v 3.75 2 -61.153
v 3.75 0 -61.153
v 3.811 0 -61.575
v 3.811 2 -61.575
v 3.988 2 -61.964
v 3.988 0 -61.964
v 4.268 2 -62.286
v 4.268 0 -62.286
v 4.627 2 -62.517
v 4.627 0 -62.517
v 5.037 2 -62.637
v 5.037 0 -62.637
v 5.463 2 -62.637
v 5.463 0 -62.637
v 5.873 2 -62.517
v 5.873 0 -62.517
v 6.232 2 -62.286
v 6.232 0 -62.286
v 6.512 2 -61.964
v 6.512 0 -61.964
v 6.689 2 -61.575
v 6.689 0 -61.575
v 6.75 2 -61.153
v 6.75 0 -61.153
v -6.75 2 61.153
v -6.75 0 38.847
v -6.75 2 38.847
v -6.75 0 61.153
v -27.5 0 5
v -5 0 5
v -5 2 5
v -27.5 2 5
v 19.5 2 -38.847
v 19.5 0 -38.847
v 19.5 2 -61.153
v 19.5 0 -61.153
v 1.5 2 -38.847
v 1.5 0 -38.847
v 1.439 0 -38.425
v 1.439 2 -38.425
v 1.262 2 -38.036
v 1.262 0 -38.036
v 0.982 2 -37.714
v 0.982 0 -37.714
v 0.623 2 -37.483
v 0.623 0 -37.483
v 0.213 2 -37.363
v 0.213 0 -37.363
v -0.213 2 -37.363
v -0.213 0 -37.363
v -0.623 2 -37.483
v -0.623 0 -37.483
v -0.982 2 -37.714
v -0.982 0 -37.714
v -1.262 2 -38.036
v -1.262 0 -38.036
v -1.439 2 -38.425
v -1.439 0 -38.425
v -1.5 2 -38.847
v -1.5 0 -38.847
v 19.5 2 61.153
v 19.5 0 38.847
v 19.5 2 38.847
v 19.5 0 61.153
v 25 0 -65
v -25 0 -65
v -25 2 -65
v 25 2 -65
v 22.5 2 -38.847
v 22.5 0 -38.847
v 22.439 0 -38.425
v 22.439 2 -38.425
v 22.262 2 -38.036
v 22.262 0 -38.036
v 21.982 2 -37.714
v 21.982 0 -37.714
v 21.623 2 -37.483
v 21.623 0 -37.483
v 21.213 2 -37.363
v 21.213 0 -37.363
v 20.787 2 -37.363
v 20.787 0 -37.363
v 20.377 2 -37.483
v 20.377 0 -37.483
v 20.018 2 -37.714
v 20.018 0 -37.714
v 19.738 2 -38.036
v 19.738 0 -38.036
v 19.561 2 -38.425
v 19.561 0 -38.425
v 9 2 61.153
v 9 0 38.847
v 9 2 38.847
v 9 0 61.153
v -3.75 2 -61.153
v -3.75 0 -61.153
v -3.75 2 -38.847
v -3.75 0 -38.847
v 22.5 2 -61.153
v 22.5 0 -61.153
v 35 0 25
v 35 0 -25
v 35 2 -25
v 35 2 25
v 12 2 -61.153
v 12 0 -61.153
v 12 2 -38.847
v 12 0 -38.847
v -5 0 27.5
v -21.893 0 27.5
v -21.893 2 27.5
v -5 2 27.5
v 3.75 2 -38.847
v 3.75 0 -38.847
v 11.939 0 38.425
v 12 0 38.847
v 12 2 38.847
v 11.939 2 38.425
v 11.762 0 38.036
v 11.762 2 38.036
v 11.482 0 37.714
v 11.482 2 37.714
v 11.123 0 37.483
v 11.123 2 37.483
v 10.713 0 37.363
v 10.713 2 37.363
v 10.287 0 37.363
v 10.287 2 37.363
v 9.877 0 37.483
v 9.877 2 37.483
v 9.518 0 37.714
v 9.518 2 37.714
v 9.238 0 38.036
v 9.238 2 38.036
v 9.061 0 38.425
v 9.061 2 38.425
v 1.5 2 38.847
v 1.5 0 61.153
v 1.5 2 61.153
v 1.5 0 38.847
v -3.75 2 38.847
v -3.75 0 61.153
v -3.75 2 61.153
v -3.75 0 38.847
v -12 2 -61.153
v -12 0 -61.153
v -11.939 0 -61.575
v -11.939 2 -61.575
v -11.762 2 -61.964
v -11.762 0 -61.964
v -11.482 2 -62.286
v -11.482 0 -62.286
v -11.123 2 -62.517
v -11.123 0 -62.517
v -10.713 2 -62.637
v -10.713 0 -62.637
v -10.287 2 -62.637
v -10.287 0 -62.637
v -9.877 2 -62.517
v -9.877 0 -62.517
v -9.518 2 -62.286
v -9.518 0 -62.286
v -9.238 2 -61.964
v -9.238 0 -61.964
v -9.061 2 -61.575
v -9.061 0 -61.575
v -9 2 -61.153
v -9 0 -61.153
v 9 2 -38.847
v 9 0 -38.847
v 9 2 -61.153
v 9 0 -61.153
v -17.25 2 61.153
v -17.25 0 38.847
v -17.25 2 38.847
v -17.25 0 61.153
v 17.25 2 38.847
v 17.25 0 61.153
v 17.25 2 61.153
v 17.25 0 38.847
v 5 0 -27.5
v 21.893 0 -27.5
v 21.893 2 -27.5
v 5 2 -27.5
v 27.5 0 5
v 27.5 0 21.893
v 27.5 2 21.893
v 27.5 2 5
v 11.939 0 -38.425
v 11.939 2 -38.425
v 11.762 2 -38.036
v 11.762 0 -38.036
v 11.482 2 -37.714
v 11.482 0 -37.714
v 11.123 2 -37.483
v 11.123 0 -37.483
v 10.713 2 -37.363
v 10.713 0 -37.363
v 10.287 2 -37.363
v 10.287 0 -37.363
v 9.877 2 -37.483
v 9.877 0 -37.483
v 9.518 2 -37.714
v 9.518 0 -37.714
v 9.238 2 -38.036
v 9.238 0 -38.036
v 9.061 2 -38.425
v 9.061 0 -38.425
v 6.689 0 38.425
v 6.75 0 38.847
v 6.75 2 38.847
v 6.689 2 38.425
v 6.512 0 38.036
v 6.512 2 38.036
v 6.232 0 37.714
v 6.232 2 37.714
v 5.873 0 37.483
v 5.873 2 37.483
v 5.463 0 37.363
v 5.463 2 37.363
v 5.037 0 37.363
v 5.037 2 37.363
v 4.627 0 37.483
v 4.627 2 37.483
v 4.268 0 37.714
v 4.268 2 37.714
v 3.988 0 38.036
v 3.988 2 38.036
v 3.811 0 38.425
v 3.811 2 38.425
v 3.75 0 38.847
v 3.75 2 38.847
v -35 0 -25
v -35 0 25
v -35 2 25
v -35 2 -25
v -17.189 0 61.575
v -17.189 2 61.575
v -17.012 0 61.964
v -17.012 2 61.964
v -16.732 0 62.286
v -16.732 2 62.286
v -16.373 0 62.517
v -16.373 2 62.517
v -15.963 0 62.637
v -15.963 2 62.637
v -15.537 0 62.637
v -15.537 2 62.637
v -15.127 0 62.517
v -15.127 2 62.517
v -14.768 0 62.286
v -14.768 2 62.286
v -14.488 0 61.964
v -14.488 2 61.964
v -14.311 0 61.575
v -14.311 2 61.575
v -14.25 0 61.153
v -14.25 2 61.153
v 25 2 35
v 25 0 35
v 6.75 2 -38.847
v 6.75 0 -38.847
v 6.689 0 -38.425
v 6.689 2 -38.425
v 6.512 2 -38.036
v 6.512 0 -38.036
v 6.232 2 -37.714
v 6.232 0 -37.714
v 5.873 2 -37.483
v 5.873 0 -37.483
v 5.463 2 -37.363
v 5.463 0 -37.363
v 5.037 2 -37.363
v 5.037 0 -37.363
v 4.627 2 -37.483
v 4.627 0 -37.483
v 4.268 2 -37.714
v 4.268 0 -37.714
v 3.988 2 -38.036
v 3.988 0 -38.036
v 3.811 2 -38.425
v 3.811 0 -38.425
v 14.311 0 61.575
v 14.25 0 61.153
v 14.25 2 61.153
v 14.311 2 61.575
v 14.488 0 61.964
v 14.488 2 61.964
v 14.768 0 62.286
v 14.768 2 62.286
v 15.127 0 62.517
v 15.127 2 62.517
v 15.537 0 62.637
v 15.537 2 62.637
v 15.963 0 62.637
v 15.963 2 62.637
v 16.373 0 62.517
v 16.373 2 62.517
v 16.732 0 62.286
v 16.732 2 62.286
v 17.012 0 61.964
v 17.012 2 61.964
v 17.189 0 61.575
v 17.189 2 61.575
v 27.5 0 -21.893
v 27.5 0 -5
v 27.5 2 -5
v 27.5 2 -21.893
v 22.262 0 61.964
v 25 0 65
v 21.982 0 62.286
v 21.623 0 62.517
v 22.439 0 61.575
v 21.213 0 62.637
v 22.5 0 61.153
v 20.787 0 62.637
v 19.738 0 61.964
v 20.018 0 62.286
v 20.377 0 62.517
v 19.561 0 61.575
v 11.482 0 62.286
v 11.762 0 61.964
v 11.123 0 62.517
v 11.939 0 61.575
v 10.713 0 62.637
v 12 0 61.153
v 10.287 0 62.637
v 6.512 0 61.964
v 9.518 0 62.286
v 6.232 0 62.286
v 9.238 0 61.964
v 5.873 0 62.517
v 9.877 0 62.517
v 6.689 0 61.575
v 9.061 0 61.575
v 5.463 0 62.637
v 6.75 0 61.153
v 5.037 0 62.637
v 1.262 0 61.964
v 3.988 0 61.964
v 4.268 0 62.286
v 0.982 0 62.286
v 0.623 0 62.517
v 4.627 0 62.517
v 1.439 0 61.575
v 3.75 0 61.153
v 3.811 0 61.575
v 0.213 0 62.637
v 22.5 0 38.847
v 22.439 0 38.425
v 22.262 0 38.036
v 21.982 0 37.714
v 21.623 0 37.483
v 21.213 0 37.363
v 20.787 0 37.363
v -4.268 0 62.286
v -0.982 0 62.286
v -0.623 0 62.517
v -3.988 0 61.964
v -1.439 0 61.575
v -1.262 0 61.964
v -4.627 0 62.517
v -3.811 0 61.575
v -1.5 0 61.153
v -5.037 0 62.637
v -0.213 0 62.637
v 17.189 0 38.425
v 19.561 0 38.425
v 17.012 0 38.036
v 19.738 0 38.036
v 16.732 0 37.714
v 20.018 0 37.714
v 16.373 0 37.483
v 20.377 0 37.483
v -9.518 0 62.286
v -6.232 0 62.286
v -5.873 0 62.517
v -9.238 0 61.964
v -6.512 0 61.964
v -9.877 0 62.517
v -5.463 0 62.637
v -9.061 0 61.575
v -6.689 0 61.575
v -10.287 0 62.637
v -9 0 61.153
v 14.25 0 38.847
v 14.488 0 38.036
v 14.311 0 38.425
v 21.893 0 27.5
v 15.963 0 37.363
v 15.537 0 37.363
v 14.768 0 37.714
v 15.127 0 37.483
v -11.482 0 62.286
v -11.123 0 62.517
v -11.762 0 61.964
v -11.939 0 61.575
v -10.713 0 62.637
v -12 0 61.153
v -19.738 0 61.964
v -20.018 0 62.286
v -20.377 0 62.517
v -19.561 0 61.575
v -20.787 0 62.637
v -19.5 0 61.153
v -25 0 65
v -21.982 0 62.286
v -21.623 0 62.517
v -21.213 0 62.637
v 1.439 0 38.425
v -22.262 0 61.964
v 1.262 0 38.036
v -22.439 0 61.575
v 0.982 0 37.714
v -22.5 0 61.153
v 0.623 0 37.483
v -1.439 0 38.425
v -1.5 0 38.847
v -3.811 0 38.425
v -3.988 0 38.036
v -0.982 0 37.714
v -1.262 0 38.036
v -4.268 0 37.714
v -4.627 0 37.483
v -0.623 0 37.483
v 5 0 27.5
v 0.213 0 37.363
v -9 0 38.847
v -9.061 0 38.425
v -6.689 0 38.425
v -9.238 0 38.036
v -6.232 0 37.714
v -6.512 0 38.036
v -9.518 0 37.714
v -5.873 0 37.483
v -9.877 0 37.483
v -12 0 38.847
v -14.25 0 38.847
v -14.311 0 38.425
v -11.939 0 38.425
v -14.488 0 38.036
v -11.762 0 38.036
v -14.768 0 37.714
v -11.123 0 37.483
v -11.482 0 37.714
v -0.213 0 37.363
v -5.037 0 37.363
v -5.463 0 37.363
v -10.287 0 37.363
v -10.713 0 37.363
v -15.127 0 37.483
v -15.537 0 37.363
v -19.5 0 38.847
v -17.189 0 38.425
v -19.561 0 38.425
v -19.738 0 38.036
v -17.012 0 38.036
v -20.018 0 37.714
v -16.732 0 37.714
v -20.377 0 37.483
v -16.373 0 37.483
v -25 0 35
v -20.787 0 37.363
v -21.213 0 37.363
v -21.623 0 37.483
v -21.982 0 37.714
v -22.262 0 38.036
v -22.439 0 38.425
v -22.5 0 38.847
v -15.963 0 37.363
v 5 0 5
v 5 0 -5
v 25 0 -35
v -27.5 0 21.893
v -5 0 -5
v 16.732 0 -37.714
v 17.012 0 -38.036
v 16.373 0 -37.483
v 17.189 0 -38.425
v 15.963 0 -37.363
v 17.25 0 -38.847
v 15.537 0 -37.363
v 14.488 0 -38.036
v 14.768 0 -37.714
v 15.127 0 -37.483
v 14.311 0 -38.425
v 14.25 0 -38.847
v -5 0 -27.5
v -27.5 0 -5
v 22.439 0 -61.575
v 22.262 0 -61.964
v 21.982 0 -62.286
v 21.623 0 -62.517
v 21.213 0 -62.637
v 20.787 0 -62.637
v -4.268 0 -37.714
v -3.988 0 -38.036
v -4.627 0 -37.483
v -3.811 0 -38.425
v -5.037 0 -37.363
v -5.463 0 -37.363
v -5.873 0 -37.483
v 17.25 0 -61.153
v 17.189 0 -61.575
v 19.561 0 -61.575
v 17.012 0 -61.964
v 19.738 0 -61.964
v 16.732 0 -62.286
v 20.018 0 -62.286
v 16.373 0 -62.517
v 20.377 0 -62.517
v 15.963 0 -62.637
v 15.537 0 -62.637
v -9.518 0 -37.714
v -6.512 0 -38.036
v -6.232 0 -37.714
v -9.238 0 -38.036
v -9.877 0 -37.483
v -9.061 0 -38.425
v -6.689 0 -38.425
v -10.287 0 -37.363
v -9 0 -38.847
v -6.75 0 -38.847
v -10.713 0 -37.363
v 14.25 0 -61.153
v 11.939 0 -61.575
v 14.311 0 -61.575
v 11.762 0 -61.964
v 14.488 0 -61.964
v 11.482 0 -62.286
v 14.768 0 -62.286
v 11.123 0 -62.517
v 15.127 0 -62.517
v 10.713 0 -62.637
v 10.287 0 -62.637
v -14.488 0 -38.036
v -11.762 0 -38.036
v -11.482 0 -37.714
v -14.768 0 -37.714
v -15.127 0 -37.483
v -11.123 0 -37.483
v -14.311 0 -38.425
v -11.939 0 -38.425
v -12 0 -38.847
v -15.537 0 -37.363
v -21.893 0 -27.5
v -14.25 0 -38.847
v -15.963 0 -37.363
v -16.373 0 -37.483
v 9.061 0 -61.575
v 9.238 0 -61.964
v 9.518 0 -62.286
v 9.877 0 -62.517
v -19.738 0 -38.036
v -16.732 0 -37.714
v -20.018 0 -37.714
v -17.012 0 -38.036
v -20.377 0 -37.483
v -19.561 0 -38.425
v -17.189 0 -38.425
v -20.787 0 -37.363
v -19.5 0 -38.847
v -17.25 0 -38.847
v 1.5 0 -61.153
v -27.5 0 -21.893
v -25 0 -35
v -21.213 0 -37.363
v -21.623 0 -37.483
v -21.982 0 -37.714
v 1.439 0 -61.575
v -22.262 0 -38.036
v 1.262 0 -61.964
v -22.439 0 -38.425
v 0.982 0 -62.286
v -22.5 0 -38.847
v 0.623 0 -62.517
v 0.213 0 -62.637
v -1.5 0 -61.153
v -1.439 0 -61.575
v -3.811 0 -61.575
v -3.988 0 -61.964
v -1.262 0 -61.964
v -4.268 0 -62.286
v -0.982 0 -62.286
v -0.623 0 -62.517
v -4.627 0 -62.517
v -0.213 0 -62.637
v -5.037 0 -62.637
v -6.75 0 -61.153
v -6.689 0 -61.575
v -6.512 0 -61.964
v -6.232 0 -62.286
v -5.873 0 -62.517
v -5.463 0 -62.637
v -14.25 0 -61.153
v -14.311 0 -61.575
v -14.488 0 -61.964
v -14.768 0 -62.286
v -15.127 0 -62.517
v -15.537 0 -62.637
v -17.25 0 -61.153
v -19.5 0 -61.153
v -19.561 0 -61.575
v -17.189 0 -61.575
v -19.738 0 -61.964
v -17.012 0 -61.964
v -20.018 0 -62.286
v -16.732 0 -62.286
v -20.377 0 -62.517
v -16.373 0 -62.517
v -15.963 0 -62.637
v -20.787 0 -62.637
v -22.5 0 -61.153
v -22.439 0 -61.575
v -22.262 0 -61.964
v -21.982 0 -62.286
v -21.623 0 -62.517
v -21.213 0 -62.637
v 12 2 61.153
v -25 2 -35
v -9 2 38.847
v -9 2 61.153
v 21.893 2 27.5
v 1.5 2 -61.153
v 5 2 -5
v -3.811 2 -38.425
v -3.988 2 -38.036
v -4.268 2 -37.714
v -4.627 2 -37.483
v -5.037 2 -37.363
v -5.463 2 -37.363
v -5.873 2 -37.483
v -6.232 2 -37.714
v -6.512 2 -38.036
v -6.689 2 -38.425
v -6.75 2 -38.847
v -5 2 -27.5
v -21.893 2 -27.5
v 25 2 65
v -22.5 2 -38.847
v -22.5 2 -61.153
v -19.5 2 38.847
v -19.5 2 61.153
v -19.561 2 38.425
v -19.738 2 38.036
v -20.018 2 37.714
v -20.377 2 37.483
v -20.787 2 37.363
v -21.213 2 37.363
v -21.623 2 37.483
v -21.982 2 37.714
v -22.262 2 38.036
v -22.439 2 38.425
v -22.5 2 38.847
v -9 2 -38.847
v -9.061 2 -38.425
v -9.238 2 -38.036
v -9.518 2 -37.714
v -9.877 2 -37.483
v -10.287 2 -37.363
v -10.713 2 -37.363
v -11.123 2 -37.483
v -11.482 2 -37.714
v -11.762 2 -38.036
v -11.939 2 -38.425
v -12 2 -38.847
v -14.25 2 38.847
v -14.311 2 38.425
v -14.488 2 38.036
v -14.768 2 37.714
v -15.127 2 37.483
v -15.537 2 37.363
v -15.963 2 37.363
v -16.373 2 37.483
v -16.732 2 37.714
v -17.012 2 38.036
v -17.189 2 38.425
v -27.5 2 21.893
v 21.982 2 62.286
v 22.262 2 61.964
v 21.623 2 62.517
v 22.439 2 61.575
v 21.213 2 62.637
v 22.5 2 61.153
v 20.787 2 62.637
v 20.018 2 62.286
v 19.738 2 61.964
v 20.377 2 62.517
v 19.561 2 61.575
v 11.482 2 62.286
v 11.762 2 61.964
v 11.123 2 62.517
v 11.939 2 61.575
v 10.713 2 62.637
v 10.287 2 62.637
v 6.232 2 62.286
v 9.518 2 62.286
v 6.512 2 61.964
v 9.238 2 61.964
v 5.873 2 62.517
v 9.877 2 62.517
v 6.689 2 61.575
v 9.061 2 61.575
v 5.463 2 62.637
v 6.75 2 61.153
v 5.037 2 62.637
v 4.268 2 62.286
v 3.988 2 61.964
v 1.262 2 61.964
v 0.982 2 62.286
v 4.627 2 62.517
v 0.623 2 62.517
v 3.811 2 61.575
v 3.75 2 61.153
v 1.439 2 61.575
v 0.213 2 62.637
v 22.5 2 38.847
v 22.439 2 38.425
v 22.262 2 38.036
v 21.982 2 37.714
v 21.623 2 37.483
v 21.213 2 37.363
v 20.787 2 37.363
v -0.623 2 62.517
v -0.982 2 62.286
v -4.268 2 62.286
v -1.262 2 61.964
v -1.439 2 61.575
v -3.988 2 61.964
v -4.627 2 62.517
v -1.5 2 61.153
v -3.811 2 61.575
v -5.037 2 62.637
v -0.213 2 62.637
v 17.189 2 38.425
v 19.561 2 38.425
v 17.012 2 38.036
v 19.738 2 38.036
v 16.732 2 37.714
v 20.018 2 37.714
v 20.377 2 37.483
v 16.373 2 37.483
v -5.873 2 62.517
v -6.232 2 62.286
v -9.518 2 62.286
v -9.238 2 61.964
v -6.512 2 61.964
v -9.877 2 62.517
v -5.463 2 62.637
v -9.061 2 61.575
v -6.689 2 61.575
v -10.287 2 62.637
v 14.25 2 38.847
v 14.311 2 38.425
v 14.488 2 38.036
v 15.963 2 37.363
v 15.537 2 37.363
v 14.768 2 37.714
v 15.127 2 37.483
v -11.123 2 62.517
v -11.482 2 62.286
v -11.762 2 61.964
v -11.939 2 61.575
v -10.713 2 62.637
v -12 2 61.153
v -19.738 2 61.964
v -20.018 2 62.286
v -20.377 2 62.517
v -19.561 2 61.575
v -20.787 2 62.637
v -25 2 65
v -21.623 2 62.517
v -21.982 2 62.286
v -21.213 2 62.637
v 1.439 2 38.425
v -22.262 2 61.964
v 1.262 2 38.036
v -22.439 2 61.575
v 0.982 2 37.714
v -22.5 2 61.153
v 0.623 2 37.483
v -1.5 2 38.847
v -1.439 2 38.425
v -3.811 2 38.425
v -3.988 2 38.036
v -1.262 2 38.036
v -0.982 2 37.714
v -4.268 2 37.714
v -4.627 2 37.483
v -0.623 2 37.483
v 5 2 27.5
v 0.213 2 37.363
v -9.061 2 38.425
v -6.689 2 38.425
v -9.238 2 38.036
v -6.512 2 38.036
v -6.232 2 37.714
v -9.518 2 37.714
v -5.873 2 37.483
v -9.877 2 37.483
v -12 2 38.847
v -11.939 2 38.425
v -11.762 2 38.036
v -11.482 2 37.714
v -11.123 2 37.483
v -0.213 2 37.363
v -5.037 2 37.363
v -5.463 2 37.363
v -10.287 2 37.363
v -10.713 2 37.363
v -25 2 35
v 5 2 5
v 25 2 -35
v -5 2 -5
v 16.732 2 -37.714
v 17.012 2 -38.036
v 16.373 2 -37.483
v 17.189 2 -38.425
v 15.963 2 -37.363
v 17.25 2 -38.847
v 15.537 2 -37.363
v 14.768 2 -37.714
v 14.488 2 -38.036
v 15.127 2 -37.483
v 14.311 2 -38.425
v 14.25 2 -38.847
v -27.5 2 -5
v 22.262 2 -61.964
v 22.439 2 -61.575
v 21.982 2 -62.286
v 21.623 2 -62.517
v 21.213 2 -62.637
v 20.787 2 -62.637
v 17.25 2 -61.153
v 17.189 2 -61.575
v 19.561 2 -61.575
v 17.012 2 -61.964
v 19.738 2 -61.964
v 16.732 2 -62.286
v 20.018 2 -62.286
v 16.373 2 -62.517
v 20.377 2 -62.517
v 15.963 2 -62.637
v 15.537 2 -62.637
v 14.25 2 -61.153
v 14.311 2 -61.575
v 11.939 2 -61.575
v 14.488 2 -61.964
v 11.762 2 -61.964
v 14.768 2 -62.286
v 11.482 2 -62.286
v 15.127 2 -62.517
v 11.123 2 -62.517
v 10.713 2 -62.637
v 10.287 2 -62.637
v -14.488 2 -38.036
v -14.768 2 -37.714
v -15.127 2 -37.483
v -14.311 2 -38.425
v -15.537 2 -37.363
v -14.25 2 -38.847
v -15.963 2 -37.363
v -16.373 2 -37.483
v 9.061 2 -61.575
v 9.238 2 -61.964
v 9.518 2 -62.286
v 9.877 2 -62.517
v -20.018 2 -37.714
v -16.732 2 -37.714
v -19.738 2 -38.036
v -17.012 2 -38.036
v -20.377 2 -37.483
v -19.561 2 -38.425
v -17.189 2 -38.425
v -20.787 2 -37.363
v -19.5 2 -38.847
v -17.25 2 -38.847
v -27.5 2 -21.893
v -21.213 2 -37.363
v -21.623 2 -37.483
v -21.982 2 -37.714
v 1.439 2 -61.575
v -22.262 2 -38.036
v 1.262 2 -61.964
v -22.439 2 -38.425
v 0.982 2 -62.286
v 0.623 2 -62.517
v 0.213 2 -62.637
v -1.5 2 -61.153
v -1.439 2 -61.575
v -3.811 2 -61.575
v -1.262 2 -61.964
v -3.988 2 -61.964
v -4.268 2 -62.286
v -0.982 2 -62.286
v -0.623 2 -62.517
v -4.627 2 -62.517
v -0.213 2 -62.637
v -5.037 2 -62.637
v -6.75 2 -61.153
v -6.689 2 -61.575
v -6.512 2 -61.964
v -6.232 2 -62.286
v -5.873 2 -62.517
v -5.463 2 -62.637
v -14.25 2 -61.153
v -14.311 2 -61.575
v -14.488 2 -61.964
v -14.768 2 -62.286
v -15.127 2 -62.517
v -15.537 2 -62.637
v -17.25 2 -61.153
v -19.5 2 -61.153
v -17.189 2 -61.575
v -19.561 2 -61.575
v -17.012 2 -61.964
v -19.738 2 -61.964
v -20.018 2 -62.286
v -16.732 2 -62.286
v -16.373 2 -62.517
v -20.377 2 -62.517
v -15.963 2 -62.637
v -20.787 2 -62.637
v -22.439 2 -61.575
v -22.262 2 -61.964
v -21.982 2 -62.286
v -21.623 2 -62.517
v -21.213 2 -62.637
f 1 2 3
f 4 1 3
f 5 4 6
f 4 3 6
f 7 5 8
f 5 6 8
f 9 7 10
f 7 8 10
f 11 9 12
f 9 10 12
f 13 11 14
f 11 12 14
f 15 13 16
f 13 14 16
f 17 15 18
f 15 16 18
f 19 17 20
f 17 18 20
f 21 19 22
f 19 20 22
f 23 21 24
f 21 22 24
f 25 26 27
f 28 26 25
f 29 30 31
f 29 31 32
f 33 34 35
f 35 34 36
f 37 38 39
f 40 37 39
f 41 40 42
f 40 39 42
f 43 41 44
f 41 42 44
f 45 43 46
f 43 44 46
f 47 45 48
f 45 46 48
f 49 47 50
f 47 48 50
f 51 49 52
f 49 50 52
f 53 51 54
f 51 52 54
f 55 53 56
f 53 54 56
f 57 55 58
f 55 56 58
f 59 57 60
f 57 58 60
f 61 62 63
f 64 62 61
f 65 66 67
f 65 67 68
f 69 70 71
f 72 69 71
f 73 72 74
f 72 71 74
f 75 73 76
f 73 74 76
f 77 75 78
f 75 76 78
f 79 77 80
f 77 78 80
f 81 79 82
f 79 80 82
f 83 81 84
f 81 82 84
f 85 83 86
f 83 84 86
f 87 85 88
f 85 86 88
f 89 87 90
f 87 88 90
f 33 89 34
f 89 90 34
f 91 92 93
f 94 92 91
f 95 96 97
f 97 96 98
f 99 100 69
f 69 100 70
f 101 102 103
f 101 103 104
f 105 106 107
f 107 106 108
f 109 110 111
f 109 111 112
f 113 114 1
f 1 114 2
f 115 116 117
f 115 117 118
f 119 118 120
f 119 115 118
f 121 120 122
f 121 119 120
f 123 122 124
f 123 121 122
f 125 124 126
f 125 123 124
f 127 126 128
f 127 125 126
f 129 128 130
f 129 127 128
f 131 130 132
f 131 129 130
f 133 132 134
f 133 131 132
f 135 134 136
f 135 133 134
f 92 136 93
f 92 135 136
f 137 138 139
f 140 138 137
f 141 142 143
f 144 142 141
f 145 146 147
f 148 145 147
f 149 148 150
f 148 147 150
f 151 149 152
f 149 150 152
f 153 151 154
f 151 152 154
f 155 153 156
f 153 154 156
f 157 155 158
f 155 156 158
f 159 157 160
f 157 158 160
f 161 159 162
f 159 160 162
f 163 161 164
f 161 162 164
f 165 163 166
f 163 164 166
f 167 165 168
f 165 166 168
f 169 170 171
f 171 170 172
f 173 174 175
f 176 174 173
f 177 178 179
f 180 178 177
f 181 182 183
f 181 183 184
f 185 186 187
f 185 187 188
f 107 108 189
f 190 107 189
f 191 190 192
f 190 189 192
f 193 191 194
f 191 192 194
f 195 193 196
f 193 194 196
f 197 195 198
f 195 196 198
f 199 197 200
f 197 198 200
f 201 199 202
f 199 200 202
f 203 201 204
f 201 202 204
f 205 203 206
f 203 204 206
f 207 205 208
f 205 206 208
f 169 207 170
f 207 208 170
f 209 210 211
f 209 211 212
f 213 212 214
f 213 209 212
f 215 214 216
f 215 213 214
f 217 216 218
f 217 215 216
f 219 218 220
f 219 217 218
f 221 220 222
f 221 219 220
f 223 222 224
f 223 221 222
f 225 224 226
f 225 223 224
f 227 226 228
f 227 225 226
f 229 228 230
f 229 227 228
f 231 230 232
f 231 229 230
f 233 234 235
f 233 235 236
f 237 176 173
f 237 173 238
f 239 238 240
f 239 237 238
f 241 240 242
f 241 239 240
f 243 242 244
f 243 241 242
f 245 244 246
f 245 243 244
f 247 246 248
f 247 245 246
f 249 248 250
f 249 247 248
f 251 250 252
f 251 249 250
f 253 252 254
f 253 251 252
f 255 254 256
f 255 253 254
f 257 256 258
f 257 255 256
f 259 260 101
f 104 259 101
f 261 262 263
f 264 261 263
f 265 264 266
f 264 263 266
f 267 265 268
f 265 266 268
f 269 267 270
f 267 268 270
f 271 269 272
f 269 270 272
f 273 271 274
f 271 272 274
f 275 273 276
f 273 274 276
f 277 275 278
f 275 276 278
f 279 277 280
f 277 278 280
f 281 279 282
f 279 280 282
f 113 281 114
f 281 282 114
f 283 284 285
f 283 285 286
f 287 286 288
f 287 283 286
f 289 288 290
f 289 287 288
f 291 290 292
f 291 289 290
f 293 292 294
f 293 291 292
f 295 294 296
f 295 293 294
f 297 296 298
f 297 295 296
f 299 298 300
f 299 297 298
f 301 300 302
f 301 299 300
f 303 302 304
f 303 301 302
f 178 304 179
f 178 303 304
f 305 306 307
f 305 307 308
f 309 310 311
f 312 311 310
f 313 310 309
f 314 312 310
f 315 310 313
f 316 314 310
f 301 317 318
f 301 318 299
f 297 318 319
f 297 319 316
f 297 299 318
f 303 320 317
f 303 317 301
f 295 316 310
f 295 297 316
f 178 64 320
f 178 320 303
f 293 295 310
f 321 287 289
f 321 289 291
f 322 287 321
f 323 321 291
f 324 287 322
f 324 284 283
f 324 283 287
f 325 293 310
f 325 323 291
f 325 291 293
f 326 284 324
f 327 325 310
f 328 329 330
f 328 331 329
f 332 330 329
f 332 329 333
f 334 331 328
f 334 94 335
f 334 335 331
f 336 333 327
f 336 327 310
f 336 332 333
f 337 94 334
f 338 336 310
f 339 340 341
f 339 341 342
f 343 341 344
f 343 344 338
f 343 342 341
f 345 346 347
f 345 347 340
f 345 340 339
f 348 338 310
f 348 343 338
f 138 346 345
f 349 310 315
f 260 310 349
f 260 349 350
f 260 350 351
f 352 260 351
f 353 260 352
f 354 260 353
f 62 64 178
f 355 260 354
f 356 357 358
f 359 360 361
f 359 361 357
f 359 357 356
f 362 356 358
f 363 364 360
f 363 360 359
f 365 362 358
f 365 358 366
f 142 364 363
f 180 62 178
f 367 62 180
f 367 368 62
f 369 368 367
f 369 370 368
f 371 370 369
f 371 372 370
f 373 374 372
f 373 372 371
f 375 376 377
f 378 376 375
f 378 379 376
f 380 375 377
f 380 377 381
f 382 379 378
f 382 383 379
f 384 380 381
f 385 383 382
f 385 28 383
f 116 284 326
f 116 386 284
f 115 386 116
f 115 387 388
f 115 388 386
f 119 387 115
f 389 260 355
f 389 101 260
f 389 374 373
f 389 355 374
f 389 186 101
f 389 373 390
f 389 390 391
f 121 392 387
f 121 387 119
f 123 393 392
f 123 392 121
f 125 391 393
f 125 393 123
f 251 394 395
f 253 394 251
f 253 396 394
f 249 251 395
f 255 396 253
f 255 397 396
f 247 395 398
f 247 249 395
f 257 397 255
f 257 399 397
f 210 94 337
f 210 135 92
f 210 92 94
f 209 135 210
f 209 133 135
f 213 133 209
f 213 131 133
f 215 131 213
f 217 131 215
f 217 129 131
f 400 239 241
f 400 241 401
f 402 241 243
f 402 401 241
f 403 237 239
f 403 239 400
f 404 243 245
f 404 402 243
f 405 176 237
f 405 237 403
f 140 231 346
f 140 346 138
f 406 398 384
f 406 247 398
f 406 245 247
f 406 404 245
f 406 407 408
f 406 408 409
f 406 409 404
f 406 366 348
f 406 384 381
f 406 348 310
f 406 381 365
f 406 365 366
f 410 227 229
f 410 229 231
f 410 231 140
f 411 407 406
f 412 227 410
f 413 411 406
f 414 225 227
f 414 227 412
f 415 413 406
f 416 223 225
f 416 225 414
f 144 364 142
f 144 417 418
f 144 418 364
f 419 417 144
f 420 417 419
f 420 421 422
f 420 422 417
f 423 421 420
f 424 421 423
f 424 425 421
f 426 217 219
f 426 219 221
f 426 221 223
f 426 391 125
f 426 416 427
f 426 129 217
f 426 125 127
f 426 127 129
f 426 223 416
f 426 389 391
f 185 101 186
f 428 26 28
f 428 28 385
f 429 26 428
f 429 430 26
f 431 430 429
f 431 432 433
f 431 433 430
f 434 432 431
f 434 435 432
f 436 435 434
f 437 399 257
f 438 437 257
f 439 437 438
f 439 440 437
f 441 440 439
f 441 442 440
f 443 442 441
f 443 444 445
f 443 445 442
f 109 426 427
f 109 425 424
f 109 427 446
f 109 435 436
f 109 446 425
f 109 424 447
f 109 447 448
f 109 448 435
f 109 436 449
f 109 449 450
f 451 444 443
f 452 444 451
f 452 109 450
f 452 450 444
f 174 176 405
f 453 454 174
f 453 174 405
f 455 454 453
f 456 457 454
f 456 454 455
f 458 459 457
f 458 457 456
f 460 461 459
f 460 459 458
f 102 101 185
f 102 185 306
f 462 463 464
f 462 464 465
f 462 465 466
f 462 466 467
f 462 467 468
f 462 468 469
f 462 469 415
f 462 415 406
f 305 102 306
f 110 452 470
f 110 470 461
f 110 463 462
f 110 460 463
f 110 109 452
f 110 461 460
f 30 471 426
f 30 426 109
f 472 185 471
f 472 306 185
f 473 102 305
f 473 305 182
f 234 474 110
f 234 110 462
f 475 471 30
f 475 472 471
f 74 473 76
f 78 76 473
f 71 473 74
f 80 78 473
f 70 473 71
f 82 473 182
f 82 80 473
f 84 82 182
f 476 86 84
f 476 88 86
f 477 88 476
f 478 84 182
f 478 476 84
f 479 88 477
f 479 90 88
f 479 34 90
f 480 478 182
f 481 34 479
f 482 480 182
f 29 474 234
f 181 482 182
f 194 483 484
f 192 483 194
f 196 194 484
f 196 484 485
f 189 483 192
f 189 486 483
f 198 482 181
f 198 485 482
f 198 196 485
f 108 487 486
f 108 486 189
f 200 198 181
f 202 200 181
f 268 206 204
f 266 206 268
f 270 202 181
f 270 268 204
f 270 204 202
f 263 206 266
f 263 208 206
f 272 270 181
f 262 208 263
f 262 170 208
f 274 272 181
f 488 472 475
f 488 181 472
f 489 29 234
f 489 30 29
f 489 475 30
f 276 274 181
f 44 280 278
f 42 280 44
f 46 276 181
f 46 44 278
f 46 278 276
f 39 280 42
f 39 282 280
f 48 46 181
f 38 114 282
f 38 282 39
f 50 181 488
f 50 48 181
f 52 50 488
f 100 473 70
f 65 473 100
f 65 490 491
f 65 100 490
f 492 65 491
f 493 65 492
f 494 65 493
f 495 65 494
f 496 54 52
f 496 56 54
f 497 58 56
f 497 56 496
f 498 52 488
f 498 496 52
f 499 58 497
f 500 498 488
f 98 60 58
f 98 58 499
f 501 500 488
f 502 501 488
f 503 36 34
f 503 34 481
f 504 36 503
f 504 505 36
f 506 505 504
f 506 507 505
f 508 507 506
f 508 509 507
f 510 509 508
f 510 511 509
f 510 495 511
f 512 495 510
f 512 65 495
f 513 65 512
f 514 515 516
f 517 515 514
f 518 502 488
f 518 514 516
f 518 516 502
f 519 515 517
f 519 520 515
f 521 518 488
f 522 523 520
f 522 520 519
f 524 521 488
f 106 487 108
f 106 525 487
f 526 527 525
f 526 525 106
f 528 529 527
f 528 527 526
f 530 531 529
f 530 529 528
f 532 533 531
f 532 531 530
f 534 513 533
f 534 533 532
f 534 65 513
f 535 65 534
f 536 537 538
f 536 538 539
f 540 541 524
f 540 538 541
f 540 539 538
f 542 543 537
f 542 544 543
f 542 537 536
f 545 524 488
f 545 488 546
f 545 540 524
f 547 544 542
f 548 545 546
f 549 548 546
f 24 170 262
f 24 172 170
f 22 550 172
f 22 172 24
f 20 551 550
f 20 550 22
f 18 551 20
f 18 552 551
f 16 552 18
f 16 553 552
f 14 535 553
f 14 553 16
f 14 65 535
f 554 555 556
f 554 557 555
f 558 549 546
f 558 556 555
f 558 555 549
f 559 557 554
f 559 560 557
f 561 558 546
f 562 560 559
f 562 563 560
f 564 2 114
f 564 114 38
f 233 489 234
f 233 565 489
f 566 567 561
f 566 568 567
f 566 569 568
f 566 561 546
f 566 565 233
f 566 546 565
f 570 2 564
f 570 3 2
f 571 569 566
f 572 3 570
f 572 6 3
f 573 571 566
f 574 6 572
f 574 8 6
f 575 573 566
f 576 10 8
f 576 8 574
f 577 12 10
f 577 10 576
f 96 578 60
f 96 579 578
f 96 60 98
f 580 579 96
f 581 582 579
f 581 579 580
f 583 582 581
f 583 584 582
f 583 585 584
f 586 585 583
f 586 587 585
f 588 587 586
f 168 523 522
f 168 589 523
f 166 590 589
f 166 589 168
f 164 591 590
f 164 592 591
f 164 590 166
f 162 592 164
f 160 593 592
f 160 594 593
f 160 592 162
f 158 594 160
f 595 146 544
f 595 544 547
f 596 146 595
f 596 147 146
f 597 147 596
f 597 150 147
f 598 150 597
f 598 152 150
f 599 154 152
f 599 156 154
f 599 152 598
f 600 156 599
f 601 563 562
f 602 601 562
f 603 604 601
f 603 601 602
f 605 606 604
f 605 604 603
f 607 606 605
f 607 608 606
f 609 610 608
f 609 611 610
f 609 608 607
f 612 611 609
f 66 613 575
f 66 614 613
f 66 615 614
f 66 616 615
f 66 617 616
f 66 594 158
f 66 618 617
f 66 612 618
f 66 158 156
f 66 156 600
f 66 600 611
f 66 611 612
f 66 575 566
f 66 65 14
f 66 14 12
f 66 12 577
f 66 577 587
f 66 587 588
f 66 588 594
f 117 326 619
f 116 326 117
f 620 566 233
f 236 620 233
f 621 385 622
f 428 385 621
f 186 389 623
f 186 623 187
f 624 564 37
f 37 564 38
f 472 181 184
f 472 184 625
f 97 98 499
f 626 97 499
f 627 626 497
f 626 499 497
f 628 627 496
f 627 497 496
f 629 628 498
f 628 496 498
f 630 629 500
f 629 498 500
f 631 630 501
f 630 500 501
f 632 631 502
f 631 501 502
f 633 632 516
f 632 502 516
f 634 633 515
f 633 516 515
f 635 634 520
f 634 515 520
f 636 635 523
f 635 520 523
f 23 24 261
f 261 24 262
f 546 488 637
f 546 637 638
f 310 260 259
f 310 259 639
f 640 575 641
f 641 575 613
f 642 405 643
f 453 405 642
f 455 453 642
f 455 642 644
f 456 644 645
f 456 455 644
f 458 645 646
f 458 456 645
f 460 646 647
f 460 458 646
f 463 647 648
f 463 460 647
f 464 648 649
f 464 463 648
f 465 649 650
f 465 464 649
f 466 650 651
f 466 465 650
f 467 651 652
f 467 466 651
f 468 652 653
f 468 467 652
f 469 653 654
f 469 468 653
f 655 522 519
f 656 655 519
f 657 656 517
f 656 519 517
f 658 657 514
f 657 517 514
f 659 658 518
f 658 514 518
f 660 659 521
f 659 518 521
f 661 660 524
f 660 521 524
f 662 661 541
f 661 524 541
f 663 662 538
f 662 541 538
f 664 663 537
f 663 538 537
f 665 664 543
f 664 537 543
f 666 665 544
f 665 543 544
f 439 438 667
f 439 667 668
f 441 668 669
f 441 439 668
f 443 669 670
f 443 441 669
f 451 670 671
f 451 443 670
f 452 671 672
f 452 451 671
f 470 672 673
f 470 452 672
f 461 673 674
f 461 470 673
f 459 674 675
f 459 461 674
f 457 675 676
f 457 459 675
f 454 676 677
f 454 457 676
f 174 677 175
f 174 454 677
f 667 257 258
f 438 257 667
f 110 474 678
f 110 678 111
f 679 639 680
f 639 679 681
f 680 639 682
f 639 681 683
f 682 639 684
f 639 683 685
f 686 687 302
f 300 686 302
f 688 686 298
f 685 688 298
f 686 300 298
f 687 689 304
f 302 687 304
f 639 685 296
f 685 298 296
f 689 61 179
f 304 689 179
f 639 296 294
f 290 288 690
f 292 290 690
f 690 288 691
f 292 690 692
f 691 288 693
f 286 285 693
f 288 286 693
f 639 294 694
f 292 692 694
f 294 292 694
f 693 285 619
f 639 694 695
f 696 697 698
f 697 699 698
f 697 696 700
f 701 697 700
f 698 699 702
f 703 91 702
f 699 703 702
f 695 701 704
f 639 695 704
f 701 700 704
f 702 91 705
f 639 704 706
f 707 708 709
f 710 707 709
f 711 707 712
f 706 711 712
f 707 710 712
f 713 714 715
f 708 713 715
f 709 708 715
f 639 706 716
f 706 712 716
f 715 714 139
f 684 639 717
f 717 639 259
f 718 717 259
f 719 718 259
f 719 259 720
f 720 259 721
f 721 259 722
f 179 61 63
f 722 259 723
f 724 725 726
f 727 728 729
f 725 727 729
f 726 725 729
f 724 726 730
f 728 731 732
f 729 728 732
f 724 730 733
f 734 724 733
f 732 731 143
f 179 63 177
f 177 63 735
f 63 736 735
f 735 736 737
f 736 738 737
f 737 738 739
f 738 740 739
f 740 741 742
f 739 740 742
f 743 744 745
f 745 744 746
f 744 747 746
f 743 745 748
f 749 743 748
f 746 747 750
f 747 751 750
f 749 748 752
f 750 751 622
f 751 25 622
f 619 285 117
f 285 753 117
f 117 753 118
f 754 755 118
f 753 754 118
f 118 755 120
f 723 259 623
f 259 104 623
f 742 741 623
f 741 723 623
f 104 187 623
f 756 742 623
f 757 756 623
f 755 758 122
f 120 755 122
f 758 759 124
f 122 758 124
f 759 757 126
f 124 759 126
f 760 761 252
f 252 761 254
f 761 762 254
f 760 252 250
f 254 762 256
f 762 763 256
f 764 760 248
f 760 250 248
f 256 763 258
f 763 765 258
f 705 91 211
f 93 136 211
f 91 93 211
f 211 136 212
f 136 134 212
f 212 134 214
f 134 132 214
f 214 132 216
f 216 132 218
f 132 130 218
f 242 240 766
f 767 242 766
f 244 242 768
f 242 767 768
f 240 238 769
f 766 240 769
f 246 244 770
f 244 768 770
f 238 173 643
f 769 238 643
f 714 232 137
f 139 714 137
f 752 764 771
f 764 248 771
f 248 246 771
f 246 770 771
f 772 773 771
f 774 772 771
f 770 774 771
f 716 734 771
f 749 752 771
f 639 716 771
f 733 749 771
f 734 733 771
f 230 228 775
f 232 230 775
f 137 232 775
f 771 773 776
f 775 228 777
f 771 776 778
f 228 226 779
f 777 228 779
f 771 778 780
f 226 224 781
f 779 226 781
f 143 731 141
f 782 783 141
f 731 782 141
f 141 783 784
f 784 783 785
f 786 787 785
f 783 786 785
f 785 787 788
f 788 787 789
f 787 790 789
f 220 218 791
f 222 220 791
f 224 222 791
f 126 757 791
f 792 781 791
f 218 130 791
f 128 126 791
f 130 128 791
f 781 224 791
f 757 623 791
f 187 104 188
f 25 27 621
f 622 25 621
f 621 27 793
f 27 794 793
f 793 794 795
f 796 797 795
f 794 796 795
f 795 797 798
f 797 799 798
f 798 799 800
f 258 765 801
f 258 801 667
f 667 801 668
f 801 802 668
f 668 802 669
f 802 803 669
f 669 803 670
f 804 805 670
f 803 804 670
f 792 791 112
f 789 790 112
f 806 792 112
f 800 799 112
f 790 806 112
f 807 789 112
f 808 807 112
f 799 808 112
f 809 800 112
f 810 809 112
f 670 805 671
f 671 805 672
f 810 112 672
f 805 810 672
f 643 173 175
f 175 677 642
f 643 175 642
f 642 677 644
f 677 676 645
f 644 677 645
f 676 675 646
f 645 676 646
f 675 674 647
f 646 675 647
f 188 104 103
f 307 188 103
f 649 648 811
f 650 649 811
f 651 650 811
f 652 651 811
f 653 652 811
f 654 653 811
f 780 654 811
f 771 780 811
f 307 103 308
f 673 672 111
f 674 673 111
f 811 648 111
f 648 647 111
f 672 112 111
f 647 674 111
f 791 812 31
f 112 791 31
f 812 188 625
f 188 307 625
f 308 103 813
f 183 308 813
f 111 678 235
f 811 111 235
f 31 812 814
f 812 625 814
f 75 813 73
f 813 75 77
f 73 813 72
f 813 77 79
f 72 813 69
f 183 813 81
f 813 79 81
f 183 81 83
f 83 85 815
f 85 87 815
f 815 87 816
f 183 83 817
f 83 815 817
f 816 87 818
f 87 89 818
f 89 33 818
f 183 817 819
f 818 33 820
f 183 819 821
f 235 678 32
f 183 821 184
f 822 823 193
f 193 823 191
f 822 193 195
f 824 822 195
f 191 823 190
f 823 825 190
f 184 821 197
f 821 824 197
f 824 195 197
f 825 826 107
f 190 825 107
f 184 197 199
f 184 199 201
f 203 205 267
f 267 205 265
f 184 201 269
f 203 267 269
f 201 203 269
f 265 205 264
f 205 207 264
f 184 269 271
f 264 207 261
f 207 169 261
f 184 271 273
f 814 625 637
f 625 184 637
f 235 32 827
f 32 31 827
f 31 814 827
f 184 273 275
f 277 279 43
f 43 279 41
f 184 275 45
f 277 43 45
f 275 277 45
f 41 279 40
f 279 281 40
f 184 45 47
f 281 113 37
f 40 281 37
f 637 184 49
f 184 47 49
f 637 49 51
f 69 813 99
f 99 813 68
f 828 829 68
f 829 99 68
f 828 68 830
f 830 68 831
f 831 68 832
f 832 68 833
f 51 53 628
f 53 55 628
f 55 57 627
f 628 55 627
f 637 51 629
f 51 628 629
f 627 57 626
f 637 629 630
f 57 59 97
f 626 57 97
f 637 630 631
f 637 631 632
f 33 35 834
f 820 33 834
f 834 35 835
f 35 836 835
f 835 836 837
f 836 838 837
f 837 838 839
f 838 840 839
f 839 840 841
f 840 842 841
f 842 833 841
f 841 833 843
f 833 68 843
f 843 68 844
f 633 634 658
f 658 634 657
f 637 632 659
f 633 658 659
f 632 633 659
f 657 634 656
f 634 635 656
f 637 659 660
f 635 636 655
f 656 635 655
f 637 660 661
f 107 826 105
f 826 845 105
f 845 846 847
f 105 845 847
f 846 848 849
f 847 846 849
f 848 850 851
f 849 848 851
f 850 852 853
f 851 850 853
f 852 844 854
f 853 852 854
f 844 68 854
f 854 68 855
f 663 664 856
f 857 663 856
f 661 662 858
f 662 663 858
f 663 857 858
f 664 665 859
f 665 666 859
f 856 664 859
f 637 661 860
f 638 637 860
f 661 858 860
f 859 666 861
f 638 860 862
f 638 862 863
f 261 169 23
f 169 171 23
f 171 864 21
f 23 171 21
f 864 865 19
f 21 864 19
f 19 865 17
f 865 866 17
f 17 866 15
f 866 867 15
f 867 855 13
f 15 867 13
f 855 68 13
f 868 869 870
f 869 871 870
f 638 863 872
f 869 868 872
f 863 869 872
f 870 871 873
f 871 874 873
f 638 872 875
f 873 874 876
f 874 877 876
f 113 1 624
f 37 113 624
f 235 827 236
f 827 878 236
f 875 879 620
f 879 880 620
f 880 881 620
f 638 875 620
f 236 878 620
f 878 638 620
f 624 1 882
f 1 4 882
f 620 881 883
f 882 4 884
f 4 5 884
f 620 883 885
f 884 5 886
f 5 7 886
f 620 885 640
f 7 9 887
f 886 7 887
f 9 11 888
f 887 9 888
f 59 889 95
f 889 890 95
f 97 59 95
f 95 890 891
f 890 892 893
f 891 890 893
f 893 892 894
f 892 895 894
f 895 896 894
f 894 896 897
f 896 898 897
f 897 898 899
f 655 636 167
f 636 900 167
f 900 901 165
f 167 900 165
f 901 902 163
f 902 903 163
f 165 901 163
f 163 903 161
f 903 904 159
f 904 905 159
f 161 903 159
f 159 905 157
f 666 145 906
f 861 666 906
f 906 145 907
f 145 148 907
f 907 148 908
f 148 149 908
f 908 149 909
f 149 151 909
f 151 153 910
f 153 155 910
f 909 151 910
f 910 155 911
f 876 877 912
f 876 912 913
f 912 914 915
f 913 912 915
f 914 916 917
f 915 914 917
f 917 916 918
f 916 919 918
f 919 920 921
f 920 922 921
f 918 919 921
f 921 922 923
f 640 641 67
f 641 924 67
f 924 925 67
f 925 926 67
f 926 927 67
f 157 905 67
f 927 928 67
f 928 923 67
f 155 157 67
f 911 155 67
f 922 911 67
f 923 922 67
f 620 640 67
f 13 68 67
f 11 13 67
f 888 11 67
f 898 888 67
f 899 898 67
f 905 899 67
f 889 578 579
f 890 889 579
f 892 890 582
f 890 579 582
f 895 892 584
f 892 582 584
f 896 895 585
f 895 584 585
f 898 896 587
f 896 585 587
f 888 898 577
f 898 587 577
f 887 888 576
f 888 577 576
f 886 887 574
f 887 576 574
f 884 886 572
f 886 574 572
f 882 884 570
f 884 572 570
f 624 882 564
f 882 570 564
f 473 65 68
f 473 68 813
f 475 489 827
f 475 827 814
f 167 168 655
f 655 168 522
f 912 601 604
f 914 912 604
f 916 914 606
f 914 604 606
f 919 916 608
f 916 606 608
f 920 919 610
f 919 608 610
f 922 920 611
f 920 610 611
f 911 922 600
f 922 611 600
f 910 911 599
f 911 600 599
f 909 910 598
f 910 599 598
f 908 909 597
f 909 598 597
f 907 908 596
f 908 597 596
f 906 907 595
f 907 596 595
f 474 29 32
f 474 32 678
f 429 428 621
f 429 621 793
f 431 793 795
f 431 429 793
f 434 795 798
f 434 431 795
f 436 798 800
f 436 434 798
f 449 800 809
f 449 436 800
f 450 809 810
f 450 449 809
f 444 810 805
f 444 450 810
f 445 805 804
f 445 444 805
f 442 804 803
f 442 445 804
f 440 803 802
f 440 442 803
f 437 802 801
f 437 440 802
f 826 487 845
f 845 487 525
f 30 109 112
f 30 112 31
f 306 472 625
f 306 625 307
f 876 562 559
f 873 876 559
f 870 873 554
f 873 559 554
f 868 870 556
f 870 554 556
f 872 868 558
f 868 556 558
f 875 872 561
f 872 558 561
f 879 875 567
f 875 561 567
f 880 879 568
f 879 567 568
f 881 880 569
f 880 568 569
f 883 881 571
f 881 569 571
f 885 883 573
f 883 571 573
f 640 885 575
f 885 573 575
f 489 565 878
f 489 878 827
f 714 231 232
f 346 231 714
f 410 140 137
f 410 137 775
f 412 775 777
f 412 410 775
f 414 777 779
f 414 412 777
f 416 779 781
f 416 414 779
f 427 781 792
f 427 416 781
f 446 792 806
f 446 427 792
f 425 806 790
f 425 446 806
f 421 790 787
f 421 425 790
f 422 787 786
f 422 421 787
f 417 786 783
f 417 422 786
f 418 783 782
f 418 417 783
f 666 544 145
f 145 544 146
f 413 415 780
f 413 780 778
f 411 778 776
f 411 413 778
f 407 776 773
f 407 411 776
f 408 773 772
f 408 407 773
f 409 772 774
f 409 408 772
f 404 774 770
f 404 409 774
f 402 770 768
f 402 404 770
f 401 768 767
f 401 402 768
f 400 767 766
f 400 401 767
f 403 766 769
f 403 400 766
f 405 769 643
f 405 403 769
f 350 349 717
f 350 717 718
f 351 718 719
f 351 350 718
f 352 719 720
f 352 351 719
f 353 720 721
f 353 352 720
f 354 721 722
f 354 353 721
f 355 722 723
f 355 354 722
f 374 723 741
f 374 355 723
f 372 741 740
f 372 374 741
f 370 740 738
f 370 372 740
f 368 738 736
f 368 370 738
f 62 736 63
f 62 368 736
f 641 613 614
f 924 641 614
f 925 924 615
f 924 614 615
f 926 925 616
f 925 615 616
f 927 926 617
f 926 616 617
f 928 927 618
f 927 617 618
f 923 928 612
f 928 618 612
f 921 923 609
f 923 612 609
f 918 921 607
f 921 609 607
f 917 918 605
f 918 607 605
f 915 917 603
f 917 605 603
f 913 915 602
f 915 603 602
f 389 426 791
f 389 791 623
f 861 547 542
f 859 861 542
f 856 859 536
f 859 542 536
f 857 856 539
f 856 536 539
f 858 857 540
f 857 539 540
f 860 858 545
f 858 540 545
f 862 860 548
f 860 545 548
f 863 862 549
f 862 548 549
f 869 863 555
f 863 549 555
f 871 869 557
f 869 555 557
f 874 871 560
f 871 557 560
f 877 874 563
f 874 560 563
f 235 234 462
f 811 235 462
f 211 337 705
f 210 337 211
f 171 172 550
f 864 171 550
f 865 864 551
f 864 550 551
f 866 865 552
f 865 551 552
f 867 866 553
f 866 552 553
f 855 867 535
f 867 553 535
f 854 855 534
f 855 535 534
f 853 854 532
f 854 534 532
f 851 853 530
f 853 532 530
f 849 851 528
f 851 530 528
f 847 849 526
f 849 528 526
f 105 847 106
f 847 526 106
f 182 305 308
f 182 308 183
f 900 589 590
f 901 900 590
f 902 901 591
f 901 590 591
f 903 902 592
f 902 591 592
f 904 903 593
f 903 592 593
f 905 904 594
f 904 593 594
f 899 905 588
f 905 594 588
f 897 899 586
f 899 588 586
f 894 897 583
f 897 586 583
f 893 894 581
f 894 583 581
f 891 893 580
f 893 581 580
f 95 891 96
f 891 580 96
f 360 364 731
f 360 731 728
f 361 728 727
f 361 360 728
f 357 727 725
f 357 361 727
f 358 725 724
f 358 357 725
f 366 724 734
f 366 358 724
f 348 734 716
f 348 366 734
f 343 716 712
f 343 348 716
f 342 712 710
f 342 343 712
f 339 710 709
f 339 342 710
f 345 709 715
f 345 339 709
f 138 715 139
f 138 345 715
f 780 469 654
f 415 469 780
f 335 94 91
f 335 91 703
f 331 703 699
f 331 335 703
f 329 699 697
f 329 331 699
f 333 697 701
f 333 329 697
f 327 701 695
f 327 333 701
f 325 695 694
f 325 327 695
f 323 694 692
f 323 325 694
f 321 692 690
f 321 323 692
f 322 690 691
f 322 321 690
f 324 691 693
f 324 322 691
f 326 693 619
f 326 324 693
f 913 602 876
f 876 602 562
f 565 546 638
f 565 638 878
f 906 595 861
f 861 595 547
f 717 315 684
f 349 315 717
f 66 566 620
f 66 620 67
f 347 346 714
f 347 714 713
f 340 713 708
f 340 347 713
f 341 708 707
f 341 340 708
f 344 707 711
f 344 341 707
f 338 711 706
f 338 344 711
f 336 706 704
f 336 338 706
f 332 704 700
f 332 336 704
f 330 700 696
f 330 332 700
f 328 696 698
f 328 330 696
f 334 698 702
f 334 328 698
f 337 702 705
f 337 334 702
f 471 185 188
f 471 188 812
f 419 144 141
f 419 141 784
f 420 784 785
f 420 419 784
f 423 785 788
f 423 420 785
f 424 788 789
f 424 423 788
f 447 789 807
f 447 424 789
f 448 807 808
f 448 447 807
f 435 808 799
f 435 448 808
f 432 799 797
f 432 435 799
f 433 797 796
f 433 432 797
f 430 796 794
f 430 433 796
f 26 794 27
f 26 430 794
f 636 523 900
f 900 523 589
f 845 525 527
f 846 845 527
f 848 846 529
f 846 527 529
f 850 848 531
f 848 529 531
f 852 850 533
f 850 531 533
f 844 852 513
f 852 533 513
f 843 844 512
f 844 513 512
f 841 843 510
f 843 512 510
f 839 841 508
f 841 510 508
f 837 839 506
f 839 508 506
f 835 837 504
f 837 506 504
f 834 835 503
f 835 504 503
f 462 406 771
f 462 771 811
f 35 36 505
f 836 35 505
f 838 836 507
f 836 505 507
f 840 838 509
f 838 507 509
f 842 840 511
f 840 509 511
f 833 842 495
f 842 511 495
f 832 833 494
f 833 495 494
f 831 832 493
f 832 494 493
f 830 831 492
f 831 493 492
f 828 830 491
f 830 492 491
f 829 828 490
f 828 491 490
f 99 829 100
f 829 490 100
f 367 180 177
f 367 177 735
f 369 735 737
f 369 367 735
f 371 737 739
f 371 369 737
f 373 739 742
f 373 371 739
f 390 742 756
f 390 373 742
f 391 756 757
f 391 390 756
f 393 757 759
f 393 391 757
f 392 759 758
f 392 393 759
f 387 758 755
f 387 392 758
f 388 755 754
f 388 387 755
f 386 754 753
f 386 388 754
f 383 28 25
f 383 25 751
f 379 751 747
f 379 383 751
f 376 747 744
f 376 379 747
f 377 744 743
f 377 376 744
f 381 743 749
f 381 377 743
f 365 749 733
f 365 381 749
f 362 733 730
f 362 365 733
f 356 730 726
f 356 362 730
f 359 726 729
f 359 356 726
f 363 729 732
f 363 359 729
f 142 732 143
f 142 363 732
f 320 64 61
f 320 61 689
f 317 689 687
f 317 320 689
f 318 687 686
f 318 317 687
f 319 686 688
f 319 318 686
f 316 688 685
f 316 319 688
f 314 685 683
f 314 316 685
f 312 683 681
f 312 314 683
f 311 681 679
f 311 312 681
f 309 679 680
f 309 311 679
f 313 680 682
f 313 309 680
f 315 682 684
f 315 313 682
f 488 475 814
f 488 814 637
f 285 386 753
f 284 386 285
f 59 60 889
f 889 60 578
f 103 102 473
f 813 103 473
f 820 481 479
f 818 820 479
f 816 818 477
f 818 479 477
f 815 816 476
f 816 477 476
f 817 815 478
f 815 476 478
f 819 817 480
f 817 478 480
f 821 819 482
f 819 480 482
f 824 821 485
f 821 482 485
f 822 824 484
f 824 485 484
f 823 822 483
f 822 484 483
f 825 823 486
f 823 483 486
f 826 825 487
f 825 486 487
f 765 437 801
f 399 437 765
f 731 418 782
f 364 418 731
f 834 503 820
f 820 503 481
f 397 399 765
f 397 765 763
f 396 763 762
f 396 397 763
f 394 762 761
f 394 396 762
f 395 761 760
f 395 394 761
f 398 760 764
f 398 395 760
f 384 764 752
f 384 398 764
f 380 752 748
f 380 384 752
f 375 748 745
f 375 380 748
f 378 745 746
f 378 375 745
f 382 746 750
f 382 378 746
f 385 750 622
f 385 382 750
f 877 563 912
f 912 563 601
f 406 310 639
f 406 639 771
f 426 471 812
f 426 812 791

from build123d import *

# Parameters (mm, degrees)
BOSS_EXTRUDE1_DEPTH = 2
CUT_EXTRUDE1_DEPTH  = 2
CIRPATTERN1_COUNT   = 4


with BuildPart() as part:
    # Sketch2 → Boss-Extrude1 (new body)
    with BuildSketch(Plane(origin=(0, 0, 0), x_dir=(1, 0, 0), z_dir=(0, 1, 0))):
        Polygon((-35, 35), (-25, 35), (-25, 65), (25, 65), (25, 35), (35, 35), (35, -35), (25, -35), (25, -65), (-25, -65), (-25, -35), (-35, -35), align=None)
        with BuildLine():
            Line((-1.5, 38.847241674), (-1.5, 61.152758326))
            ThreePointArc((-1.5, 61.152758326), (0, 62.652758326), (1.5, 61.152758326))
            Line((1.5, 61.152758326), (1.5, 38.847241674))
            ThreePointArc((1.5, 38.847241674), (0, 37.347241674), (-1.5, 38.847241674))
        make_face(mode=Mode.SUBTRACT)
        with BuildLine():
            Line((3.75, 38.847241674), (3.75, 61.152758326))
            ThreePointArc((3.75, 61.152758326), (5.25, 62.652758326), (6.75, 61.152758326))
            Line((6.75, 61.152758326), (6.75, 38.847241674))
            ThreePointArc((6.75, 38.847241674), (5.25, 37.347241674), (3.75, 38.847241674))
        make_face(mode=Mode.SUBTRACT)
        with BuildLine():
            Line((9, 38.847241674), (9, 61.152758326))
            ThreePointArc((9, 61.152758326), (10.5, 62.652758326), (12, 61.152758326))
            Line((12, 61.152758326), (12, 38.847241674))
            ThreePointArc((12, 38.847241674), (10.5, 37.347241674), (9, 38.847241674))
        make_face(mode=Mode.SUBTRACT)
        with BuildLine():
            Line((14.25, 38.847241674), (14.25, 61.152758326))
            ThreePointArc((14.25, 61.152758326), (15.75, 62.652758326), (17.25, 61.152758326))
            Line((17.25, 61.152758326), (17.25, 38.847241674))
            ThreePointArc((17.25, 38.847241674), (15.75, 37.347241674), (14.25, 38.847241674))
        make_face(mode=Mode.SUBTRACT)
        with BuildLine():
            Line((19.5, 38.847241674), (19.5, 61.152758326))
            ThreePointArc((19.5, 61.152758326), (21, 62.652758326), (22.5, 61.152758326))
            Line((22.5, 61.152758326), (22.5, 38.847241674))
            ThreePointArc((22.5, 38.847241674), (21, 37.347241674), (19.5, 38.847241674))
        make_face(mode=Mode.SUBTRACT)
        with BuildLine():
            Line((-6.75, 38.847241674), (-6.75, 61.152758326))
            ThreePointArc((-6.75, 61.152758326), (-5.25, 62.652758326), (-3.75, 61.152758326))
            Line((-3.75, 61.152758326), (-3.75, 38.847241674))
            ThreePointArc((-3.75, 38.847241674), (-5.25, 37.347241674), (-6.75, 38.847241674))
        make_face(mode=Mode.SUBTRACT)
        with BuildLine():
            Line((-12, 38.847241674), (-12, 61.152758326))
            ThreePointArc((-12, 61.152758326), (-10.5, 62.652758326), (-9, 61.152758326))
            Line((-9, 61.152758326), (-9, 38.847241674))
            ThreePointArc((-9, 38.847241674), (-10.5, 37.347241674), (-12, 38.847241674))
        make_face(mode=Mode.SUBTRACT)
        with BuildLine():
            Line((-17.25, 38.847241674), (-17.25, 61.152758326))
            ThreePointArc((-17.25, 61.152758326), (-15.75, 62.652758326), (-14.25, 61.152758326))
            Line((-14.25, 61.152758326), (-14.25, 38.847241674))
            ThreePointArc((-14.25, 38.847241674), (-15.75, 37.347241674), (-17.25, 38.847241674))
        make_face(mode=Mode.SUBTRACT)
        with BuildLine():
            Line((-22.5, 38.847241674), (-22.5, 61.152758326))
            ThreePointArc((-22.5, 61.152758326), (-21, 62.652758326), (-19.5, 61.152758326))
            Line((-19.5, 61.152758326), (-19.5, 38.847241674))
            ThreePointArc((-19.5, 38.847241674), (-21, 37.347241674), (-22.5, 38.847241674))
        make_face(mode=Mode.SUBTRACT)
        with BuildLine():
            Line((3.75, -38.847241674), (3.75, -61.152758326))
            ThreePointArc((3.75, -61.152758326), (5.25, -62.652758326), (6.75, -61.152758326))
            Line((6.75, -61.152758326), (6.75, -38.847241674))
            ThreePointArc((6.75, -38.847241674), (5.25, -37.347241674), (3.75, -38.847241674))
        make_face(mode=Mode.SUBTRACT)
        with BuildLine():
            Line((-1.5, -38.847241674), (-1.5, -61.152758326))
            ThreePointArc((-1.5, -61.152758326), (0, -62.652758326), (1.5, -61.152758326))
            Line((1.5, -61.152758326), (1.5, -38.847241674))
            ThreePointArc((1.5, -38.847241674), (0, -37.347241674), (-1.5, -38.847241674))
        make_face(mode=Mode.SUBTRACT)
        with BuildLine():
            Line((9, -38.847241674), (9, -61.152758326))
            ThreePointArc((9, -61.152758326), (10.5, -62.652758326), (12, -61.152758326))
            Line((12, -61.152758326), (12, -38.847241674))
            ThreePointArc((12, -38.847241674), (10.5, -37.347241674), (9, -38.847241674))
        make_face(mode=Mode.SUBTRACT)
        with BuildLine():
            Line((14.25, -38.847241674), (14.25, -61.152758326))
            ThreePointArc((14.25, -61.152758326), (15.75, -62.652758326), (17.25, -61.152758326))
            Line((17.25, -61.152758326), (17.25, -38.847241674))
            ThreePointArc((17.25, -38.847241674), (15.75, -37.347241674), (14.25, -38.847241674))
        make_face(mode=Mode.SUBTRACT)
        with BuildLine():
            Line((19.5, -38.847241674), (19.5, -61.152758326))
            ThreePointArc((19.5, -61.152758326), (21, -62.652758326), (22.5, -61.152758326))
            Line((22.5, -61.152758326), (22.5, -38.847241674))
            ThreePointArc((22.5, -38.847241674), (21, -37.347241674), (19.5, -38.847241674))
        make_face(mode=Mode.SUBTRACT)
        with BuildLine():
            Line((-6.75, -38.847241674), (-6.75, -61.152758326))
            ThreePointArc((-6.75, -61.152758326), (-5.25, -62.652758326), (-3.75, -61.152758326))
            Line((-3.75, -61.152758326), (-3.75, -38.847241674))
            ThreePointArc((-3.75, -38.847241674), (-5.25, -37.347241674), (-6.75, -38.847241674))
        make_face(mode=Mode.SUBTRACT)
        with BuildLine():
            Line((-12, -38.847241674), (-12, -61.152758326))
            ThreePointArc((-12, -61.152758326), (-10.5, -62.652758326), (-9, -61.152758326))
            Line((-9, -61.152758326), (-9, -38.847241674))
            ThreePointArc((-9, -38.847241674), (-10.5, -37.347241674), (-12, -38.847241674))
        make_face(mode=Mode.SUBTRACT)
        with BuildLine():
            Line((-17.25, -38.847241674), (-17.25, -61.152758326))
            ThreePointArc((-17.25, -61.152758326), (-15.75, -62.652758326), (-14.25, -61.152758326))
            Line((-14.25, -61.152758326), (-14.25, -38.847241674))
            ThreePointArc((-14.25, -38.847241674), (-15.75, -37.347241674), (-17.25, -38.847241674))
        make_face(mode=Mode.SUBTRACT)
        with BuildLine():
            Line((-22.5, -38.847241674), (-22.5, -61.152758326))
            ThreePointArc((-22.5, -61.152758326), (-21, -62.652758326), (-19.5, -61.152758326))
            Line((-19.5, -61.152758326), (-19.5, -38.847241674))
            ThreePointArc((-19.5, -38.847241674), (-21, -37.347241674), (-22.5, -38.847241674))
        make_face(mode=Mode.SUBTRACT)
    extrude(amount=BOSS_EXTRUDE1_DEPTH)

    # Sketch4 → Cut-Extrude1 (cut)
    with BuildSketch(Plane.XZ):
        Polygon((25, 35), (35, 25), (35, 35), align=None)
        Polygon((21.893398282, 27.5), (27.5, 21.893398282), (27.5, 5), (5, 5), (5, 27.5), align=None)
    cut_extrude1 = extrude(amount=-CUT_EXTRUDE1_DEPTH, mode=Mode.SUBTRACT)

    # CirPattern1: Cut-Extrude1 ×4 about axis
    cirpattern1_axis = Axis((0, 0, 0), (0, 1, 0))
    for i in range(1, CIRPATTERN1_COUNT):
        add(cut_extrude1.rotate(cirpattern1_axis, i * 360 / CIRPATTERN1_COUNT), mode=Mode.SUBTRACT)


solid = part.part
